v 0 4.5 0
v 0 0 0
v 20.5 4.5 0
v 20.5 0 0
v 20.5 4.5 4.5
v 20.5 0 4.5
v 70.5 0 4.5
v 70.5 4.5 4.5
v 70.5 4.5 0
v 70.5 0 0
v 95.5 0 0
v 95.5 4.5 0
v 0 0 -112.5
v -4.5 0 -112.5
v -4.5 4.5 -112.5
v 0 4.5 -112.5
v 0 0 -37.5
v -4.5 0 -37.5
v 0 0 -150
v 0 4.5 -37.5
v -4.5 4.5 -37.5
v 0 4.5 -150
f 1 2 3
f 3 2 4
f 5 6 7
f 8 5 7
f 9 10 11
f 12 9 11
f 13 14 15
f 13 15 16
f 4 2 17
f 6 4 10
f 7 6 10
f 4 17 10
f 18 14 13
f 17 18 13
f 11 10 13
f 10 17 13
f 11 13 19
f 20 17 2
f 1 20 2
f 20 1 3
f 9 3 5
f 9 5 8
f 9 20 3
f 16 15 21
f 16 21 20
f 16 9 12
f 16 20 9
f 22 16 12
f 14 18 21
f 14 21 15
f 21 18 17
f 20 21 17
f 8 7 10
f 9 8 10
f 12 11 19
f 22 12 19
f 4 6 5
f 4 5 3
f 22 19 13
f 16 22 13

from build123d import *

# Parameters (mm, degrees)
SKETCH1_W           = 4.5
SKETCH1_H           = 75
SKETCH1_W_2         = 50
SKETCH1_H_2         = 4.5
BOSS_EXTRUDE1_DEPTH = 4.5


with BuildPart() as part:
    # Sketch1 → Boss-Extrude1 (new body)
    with BuildSketch(Plane(origin=(0, 0, 0), x_dir=(1, 0, 0), z_dir=(0, 1, 0))):
        with Locations((-2.25, 75)):
            Rectangle(SKETCH1_W, SKETCH1_H)
        Polygon((0, 37.5), (0, 0), (20.5, 0), (20.5, 4.5), (70.5, 4.5), (70.5, 0), (95.5, 0), (0, 150), (0, 112.5), (4.5, 112.5), (4.5, 37.5), align=None)
        with Locations((45.5, -2.25)):
            Rectangle(SKETCH1_W_2, SKETCH1_H_2)
        with Locations((45.5, 2.25)):
            Rectangle(SKETCH1_W_2, SKETCH1_H_2)
        with Locations((2.25, 75)):
            Rectangle(SKETCH1_W, SKETCH1_H)
    extrude(amount=BOSS_EXTRUDE1_DEPTH)


solid = part.part
